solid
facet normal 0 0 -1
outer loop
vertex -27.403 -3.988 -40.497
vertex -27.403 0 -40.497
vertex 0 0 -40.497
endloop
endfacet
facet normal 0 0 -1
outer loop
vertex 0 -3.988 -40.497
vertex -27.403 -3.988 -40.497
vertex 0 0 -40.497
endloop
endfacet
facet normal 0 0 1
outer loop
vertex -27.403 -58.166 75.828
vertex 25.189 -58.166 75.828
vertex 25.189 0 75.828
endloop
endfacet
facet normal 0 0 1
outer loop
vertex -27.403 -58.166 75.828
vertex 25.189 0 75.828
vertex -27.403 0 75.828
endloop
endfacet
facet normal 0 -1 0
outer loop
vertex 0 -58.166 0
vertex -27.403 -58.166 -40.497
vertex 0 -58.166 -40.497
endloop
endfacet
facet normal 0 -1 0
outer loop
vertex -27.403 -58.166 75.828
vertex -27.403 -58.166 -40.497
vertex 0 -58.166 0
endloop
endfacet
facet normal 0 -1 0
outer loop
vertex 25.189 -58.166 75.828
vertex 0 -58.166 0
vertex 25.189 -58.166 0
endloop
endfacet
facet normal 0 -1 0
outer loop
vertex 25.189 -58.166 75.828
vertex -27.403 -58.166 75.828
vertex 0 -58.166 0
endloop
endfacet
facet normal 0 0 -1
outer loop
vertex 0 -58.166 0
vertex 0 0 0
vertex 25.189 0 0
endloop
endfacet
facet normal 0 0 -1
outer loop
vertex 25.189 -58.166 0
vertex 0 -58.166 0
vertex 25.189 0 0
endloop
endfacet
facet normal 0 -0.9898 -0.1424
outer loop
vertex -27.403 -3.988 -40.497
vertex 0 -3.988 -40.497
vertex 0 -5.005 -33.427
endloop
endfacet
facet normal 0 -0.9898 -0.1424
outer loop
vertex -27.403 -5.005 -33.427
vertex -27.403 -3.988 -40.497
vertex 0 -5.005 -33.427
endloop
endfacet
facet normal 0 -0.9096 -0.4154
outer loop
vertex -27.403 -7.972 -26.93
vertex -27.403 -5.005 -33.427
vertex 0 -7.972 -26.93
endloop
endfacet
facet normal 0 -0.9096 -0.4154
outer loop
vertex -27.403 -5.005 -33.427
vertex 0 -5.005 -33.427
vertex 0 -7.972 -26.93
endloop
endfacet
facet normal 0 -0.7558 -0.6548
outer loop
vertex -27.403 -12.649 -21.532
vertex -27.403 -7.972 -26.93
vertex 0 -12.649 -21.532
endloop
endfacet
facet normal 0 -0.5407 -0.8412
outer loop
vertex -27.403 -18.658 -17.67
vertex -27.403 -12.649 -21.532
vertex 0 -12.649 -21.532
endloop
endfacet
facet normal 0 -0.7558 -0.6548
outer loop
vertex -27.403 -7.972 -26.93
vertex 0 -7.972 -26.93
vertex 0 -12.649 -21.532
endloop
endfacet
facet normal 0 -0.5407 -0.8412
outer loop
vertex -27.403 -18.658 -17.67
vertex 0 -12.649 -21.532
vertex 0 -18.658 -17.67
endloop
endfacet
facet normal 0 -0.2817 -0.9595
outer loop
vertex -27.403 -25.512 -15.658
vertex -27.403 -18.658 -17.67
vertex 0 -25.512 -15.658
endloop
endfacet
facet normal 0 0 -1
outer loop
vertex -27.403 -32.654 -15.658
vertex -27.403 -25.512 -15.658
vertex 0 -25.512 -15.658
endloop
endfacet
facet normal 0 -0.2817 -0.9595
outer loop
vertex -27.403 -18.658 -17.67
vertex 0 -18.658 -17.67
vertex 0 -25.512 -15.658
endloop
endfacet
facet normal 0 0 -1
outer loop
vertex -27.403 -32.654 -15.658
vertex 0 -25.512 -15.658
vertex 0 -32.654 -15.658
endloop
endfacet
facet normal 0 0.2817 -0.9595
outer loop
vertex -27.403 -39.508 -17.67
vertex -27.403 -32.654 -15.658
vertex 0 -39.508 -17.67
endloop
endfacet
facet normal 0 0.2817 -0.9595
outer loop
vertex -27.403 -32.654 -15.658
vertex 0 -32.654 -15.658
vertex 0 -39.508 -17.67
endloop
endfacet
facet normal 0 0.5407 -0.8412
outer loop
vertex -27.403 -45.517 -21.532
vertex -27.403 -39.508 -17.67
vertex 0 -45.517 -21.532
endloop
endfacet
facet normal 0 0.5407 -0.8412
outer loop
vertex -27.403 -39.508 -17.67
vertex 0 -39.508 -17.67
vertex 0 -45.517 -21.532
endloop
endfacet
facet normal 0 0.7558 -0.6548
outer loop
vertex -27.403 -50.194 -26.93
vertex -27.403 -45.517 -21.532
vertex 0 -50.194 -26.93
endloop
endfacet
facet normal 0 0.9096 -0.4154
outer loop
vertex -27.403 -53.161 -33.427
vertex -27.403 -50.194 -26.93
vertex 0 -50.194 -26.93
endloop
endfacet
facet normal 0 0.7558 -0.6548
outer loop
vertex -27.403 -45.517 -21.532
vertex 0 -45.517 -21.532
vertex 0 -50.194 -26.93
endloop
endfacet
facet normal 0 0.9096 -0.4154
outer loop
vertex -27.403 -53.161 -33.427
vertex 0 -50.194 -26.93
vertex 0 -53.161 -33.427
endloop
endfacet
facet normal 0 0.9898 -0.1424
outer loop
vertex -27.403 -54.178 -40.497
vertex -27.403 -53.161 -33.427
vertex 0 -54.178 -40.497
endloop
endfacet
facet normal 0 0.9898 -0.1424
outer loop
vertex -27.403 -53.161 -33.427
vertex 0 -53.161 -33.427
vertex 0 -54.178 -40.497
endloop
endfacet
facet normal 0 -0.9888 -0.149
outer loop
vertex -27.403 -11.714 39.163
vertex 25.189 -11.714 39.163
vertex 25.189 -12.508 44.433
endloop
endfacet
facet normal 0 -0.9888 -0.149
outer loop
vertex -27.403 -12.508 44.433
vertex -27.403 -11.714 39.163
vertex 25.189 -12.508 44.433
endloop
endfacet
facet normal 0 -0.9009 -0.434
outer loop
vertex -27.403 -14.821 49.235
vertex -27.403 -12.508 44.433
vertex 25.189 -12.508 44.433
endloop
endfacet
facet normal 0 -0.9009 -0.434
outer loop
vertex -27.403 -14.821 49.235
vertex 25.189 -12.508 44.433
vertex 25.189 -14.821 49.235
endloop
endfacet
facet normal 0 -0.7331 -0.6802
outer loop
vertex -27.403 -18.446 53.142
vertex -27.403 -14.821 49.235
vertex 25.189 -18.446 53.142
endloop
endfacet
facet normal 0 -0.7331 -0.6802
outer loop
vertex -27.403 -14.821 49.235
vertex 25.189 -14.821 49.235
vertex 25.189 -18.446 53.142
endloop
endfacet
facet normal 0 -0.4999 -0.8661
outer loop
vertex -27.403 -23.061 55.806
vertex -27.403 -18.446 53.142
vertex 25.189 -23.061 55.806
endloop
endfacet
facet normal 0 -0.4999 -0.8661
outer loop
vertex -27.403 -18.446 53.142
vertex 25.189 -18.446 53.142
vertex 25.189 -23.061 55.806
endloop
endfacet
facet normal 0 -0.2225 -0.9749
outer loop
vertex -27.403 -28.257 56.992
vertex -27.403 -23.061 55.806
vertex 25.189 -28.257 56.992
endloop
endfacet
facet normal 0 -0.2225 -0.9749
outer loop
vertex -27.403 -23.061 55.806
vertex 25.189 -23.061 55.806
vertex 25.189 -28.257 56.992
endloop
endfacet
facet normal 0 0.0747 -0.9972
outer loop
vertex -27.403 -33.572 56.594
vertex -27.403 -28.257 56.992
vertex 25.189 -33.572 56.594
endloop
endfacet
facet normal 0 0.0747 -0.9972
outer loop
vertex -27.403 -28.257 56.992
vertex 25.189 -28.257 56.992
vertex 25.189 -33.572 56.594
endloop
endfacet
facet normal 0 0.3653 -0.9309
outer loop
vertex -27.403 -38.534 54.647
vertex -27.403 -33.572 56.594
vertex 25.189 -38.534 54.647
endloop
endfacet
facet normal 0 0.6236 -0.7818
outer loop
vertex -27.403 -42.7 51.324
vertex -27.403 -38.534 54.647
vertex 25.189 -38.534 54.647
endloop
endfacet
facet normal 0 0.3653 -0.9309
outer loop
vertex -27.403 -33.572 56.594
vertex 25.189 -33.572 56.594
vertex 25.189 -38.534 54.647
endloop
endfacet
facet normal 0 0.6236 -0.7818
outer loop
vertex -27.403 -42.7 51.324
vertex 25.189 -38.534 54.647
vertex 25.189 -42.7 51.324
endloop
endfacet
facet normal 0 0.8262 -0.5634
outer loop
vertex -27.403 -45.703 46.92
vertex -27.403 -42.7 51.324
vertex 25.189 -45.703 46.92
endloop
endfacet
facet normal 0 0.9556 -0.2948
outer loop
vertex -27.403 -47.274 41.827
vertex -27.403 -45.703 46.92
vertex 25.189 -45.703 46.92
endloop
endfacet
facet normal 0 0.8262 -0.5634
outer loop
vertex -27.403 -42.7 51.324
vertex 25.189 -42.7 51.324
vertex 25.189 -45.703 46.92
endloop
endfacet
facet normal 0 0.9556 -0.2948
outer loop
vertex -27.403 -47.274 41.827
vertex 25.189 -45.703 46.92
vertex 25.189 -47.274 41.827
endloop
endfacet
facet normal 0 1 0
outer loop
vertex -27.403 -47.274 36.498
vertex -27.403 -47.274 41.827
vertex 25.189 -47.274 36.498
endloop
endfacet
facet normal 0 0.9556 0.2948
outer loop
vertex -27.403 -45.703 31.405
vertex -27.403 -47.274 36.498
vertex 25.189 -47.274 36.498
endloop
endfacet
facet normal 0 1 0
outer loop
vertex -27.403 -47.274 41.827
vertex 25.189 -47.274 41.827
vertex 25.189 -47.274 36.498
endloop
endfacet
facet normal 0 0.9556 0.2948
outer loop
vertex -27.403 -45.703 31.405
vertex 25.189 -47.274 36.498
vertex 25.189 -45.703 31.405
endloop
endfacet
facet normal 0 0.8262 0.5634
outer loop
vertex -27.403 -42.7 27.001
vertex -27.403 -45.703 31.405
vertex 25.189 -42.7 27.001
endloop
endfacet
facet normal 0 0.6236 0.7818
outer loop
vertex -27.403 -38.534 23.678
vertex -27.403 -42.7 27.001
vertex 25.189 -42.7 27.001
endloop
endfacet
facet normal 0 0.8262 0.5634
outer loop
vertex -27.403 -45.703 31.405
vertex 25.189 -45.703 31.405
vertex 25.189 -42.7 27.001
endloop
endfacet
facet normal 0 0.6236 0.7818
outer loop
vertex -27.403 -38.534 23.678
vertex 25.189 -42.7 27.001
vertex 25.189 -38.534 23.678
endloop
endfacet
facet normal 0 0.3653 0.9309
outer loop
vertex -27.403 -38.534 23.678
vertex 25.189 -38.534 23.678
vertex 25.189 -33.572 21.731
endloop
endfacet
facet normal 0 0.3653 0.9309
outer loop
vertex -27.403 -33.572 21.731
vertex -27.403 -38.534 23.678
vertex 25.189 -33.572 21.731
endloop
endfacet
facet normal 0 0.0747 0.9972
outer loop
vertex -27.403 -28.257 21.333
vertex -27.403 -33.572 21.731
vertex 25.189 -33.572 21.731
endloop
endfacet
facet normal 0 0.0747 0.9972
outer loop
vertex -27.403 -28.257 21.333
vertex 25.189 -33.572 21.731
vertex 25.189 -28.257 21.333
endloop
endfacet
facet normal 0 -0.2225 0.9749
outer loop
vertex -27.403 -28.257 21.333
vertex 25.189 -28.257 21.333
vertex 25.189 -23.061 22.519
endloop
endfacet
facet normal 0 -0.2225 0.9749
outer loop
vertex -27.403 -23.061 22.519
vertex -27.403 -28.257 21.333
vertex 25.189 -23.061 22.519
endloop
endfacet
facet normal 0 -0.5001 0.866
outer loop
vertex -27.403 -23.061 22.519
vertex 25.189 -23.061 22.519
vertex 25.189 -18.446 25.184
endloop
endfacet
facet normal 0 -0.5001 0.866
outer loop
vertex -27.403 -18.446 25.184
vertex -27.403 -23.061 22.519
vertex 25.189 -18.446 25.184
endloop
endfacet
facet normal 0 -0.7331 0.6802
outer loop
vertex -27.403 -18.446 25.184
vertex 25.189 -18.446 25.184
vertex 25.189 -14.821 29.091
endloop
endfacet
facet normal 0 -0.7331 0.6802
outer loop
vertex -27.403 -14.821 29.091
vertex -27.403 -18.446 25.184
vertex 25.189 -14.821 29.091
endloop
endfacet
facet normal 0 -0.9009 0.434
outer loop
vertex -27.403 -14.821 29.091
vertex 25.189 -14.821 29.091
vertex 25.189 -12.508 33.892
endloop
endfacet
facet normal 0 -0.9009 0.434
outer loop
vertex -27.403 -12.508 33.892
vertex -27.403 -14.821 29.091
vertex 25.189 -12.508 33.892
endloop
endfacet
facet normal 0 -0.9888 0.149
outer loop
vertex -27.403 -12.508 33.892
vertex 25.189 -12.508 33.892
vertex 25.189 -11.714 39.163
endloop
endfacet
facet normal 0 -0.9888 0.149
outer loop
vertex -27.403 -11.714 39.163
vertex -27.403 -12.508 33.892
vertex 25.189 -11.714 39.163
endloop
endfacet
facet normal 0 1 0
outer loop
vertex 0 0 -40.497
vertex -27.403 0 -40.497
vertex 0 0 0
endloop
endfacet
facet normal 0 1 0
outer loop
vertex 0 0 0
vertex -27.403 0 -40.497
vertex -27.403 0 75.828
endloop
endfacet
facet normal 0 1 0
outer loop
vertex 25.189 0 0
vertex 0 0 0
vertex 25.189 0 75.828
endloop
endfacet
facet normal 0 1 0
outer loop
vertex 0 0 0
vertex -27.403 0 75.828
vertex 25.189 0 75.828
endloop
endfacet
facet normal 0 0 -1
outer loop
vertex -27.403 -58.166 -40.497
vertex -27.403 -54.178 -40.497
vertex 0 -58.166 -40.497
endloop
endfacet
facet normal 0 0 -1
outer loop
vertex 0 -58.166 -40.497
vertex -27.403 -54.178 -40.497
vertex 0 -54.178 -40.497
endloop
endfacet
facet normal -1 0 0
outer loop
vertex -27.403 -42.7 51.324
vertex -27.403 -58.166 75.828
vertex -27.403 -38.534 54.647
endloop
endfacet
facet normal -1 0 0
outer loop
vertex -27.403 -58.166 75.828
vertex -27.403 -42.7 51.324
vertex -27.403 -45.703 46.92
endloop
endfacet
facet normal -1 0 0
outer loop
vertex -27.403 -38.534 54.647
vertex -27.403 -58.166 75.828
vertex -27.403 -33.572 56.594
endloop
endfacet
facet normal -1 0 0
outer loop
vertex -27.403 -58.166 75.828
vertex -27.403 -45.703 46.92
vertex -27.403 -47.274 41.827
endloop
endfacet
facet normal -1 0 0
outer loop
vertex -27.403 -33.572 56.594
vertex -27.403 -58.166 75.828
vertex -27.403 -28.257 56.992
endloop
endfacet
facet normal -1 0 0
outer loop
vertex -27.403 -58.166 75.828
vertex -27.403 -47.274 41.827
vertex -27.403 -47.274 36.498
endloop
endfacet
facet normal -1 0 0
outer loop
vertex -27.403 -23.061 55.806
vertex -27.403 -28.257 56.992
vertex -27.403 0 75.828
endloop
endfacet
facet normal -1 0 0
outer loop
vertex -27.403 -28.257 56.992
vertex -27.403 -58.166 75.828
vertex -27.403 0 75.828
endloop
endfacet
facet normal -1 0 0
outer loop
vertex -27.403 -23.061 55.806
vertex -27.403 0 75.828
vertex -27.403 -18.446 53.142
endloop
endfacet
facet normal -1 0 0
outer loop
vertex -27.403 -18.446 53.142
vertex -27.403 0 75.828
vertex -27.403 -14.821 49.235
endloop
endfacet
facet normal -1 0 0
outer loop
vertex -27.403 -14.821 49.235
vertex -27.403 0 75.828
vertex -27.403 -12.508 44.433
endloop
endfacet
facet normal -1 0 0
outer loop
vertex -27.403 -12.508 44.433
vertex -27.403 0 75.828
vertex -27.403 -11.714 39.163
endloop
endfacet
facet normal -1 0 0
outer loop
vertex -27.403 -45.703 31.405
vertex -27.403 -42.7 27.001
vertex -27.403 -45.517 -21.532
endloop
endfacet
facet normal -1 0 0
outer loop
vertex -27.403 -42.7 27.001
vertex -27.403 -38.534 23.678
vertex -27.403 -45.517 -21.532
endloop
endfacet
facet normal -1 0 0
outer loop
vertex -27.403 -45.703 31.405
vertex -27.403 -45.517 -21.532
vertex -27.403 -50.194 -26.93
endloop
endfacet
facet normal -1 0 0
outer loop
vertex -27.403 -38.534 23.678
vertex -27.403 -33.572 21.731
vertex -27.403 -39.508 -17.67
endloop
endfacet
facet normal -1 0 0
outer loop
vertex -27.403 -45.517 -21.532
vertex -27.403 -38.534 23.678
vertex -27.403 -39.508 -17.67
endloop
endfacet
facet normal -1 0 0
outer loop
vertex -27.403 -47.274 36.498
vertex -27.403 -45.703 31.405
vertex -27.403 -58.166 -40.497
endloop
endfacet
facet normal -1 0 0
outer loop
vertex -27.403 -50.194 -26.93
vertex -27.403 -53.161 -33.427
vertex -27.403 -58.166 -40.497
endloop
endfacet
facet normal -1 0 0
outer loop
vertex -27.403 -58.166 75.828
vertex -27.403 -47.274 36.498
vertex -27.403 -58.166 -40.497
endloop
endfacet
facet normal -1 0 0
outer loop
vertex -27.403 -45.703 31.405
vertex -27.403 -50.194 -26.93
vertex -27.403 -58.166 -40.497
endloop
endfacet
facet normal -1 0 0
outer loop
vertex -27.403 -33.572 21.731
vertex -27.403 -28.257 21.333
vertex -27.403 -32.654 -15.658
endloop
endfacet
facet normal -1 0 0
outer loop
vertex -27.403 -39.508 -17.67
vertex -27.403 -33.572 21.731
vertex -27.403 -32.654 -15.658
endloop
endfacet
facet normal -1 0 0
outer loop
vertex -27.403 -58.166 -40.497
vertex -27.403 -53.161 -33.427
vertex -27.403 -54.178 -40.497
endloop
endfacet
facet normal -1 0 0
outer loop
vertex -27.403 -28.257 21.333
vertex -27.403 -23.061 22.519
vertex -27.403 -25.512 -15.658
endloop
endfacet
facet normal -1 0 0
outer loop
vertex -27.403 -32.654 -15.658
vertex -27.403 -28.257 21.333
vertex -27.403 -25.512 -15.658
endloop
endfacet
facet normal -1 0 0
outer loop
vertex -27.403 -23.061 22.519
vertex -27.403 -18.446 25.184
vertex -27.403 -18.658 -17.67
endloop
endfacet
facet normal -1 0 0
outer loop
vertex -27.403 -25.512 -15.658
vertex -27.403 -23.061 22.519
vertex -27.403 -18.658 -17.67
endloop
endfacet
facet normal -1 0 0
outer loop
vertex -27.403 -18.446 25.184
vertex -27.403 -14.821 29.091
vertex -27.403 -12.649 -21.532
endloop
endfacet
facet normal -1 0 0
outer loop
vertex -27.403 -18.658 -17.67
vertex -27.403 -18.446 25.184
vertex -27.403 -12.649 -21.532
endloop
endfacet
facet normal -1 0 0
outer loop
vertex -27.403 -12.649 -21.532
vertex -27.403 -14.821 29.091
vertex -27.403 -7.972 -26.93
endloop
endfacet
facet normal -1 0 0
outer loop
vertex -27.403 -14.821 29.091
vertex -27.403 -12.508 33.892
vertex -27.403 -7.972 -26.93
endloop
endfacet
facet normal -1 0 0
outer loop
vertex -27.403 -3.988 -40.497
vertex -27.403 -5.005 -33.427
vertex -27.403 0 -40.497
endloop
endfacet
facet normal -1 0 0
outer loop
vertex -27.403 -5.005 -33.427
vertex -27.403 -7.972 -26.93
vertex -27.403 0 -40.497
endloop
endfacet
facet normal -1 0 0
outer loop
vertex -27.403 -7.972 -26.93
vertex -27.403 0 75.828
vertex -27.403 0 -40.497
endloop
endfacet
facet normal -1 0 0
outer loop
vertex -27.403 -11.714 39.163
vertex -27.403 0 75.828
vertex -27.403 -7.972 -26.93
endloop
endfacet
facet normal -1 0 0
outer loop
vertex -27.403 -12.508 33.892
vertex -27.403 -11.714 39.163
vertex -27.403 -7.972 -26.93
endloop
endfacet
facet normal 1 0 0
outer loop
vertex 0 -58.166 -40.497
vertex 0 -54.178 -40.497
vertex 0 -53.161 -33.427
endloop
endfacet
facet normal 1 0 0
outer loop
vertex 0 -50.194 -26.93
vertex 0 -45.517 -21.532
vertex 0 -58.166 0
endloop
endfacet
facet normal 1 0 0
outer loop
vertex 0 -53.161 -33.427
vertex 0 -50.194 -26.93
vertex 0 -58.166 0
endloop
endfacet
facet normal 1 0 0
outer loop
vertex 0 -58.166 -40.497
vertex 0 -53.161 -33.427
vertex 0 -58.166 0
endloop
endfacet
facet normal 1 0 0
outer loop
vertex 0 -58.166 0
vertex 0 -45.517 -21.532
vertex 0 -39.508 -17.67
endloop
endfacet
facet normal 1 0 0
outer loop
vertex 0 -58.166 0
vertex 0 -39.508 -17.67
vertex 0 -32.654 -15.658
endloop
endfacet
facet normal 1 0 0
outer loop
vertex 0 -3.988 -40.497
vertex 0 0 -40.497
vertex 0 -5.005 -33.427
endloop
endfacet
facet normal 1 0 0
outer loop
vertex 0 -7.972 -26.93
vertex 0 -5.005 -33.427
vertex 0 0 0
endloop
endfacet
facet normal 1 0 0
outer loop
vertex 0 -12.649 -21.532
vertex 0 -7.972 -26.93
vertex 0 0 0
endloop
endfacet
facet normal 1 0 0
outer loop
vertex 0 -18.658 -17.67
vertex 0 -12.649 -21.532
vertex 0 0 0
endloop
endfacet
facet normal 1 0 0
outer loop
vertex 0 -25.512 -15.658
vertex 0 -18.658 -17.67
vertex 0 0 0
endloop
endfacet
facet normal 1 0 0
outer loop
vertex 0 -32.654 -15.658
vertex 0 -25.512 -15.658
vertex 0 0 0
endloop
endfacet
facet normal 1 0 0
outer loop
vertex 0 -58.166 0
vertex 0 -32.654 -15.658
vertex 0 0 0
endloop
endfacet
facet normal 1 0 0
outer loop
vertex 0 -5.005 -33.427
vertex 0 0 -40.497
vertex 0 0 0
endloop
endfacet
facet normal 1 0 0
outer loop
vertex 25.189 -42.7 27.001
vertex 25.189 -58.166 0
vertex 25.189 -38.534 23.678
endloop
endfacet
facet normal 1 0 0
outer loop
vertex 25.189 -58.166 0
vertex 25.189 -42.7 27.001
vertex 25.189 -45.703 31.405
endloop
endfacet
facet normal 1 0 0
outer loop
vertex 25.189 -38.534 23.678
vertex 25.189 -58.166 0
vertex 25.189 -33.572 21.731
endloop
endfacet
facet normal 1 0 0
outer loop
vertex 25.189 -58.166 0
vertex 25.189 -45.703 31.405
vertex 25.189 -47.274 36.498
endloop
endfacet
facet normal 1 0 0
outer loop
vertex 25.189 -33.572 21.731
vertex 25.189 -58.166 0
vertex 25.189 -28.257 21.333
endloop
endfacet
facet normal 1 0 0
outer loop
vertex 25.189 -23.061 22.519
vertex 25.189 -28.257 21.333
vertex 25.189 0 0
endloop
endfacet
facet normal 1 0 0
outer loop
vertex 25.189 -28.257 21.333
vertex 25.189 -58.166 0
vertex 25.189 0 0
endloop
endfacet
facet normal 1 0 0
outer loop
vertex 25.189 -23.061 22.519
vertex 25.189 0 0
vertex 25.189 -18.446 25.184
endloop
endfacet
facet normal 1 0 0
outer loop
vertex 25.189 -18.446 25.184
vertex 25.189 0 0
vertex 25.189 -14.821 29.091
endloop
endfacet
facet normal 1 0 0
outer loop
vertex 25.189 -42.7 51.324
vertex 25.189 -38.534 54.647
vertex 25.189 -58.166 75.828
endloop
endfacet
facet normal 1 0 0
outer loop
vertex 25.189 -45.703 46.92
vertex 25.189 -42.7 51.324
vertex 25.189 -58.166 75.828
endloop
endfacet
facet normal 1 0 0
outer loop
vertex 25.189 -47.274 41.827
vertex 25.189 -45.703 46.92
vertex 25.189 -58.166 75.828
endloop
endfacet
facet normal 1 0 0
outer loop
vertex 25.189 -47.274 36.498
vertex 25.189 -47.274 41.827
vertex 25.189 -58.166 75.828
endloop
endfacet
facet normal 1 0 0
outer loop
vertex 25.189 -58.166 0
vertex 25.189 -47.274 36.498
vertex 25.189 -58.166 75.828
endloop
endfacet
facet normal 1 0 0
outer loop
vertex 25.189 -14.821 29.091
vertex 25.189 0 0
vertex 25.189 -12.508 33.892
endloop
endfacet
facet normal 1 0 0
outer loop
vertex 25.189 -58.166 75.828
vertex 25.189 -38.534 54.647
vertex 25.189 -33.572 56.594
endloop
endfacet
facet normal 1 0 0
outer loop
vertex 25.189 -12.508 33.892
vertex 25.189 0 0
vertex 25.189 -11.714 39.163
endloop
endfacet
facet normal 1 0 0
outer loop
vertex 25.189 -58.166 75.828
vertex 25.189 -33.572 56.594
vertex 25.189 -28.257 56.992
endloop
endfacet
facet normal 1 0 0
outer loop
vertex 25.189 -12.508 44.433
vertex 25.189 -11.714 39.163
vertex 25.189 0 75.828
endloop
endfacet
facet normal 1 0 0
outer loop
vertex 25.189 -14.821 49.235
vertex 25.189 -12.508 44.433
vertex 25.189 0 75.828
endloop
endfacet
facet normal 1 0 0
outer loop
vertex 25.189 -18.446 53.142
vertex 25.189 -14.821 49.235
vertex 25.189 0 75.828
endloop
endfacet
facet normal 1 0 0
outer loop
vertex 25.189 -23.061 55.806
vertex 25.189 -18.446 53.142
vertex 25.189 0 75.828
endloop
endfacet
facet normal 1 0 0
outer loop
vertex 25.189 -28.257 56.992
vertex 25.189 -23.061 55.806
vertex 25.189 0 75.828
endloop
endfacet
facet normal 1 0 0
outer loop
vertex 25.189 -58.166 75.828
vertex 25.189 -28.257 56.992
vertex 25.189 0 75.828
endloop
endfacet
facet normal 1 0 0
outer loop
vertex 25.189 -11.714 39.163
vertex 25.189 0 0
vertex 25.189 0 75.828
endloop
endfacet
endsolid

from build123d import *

# Parameters (mm, degrees)
F1_DEPTH = 58.166
F2_R     = 17.879779
F3_DEPTH = 52.592631
F5_DEPTH = 27.403686


with BuildPart() as f1:
    # F0 (on Front) → F1 (new body)
    with BuildSketch(Plane.XZ):
        Polygon((0, -40.496975), (0, 0), (25.188945, 0), (25.188945, 75.828001), (-27.402686, 75.828001), (-27.402686, -40.496975), align=None)
    extrude(amount=F1_DEPTH)

    # F2 (on face) → F3 (cut, through all)
    with BuildSketch(Plane.YZ.offset(25.188945)):
        with Locations((-29.593647, 39.162569)):
            Circle(F2_R)
    extrude(amount=-F3_DEPTH, mode=Mode.SUBTRACT)

    # F4 (on face) → F5 (cut, through all)
    with BuildSketch(Plane.YZ):
        with BuildLine():
            Line((-54.177677, -40.496975), (-3.988323, -40.496975))
            ThreePointArc((-3.988323, -40.496975), (-29.083, -15.402298), (-54.177677, -40.496975))
        make_face()
    extrude(amount=-F5_DEPTH, mode=Mode.SUBTRACT)


solid = f1.part
